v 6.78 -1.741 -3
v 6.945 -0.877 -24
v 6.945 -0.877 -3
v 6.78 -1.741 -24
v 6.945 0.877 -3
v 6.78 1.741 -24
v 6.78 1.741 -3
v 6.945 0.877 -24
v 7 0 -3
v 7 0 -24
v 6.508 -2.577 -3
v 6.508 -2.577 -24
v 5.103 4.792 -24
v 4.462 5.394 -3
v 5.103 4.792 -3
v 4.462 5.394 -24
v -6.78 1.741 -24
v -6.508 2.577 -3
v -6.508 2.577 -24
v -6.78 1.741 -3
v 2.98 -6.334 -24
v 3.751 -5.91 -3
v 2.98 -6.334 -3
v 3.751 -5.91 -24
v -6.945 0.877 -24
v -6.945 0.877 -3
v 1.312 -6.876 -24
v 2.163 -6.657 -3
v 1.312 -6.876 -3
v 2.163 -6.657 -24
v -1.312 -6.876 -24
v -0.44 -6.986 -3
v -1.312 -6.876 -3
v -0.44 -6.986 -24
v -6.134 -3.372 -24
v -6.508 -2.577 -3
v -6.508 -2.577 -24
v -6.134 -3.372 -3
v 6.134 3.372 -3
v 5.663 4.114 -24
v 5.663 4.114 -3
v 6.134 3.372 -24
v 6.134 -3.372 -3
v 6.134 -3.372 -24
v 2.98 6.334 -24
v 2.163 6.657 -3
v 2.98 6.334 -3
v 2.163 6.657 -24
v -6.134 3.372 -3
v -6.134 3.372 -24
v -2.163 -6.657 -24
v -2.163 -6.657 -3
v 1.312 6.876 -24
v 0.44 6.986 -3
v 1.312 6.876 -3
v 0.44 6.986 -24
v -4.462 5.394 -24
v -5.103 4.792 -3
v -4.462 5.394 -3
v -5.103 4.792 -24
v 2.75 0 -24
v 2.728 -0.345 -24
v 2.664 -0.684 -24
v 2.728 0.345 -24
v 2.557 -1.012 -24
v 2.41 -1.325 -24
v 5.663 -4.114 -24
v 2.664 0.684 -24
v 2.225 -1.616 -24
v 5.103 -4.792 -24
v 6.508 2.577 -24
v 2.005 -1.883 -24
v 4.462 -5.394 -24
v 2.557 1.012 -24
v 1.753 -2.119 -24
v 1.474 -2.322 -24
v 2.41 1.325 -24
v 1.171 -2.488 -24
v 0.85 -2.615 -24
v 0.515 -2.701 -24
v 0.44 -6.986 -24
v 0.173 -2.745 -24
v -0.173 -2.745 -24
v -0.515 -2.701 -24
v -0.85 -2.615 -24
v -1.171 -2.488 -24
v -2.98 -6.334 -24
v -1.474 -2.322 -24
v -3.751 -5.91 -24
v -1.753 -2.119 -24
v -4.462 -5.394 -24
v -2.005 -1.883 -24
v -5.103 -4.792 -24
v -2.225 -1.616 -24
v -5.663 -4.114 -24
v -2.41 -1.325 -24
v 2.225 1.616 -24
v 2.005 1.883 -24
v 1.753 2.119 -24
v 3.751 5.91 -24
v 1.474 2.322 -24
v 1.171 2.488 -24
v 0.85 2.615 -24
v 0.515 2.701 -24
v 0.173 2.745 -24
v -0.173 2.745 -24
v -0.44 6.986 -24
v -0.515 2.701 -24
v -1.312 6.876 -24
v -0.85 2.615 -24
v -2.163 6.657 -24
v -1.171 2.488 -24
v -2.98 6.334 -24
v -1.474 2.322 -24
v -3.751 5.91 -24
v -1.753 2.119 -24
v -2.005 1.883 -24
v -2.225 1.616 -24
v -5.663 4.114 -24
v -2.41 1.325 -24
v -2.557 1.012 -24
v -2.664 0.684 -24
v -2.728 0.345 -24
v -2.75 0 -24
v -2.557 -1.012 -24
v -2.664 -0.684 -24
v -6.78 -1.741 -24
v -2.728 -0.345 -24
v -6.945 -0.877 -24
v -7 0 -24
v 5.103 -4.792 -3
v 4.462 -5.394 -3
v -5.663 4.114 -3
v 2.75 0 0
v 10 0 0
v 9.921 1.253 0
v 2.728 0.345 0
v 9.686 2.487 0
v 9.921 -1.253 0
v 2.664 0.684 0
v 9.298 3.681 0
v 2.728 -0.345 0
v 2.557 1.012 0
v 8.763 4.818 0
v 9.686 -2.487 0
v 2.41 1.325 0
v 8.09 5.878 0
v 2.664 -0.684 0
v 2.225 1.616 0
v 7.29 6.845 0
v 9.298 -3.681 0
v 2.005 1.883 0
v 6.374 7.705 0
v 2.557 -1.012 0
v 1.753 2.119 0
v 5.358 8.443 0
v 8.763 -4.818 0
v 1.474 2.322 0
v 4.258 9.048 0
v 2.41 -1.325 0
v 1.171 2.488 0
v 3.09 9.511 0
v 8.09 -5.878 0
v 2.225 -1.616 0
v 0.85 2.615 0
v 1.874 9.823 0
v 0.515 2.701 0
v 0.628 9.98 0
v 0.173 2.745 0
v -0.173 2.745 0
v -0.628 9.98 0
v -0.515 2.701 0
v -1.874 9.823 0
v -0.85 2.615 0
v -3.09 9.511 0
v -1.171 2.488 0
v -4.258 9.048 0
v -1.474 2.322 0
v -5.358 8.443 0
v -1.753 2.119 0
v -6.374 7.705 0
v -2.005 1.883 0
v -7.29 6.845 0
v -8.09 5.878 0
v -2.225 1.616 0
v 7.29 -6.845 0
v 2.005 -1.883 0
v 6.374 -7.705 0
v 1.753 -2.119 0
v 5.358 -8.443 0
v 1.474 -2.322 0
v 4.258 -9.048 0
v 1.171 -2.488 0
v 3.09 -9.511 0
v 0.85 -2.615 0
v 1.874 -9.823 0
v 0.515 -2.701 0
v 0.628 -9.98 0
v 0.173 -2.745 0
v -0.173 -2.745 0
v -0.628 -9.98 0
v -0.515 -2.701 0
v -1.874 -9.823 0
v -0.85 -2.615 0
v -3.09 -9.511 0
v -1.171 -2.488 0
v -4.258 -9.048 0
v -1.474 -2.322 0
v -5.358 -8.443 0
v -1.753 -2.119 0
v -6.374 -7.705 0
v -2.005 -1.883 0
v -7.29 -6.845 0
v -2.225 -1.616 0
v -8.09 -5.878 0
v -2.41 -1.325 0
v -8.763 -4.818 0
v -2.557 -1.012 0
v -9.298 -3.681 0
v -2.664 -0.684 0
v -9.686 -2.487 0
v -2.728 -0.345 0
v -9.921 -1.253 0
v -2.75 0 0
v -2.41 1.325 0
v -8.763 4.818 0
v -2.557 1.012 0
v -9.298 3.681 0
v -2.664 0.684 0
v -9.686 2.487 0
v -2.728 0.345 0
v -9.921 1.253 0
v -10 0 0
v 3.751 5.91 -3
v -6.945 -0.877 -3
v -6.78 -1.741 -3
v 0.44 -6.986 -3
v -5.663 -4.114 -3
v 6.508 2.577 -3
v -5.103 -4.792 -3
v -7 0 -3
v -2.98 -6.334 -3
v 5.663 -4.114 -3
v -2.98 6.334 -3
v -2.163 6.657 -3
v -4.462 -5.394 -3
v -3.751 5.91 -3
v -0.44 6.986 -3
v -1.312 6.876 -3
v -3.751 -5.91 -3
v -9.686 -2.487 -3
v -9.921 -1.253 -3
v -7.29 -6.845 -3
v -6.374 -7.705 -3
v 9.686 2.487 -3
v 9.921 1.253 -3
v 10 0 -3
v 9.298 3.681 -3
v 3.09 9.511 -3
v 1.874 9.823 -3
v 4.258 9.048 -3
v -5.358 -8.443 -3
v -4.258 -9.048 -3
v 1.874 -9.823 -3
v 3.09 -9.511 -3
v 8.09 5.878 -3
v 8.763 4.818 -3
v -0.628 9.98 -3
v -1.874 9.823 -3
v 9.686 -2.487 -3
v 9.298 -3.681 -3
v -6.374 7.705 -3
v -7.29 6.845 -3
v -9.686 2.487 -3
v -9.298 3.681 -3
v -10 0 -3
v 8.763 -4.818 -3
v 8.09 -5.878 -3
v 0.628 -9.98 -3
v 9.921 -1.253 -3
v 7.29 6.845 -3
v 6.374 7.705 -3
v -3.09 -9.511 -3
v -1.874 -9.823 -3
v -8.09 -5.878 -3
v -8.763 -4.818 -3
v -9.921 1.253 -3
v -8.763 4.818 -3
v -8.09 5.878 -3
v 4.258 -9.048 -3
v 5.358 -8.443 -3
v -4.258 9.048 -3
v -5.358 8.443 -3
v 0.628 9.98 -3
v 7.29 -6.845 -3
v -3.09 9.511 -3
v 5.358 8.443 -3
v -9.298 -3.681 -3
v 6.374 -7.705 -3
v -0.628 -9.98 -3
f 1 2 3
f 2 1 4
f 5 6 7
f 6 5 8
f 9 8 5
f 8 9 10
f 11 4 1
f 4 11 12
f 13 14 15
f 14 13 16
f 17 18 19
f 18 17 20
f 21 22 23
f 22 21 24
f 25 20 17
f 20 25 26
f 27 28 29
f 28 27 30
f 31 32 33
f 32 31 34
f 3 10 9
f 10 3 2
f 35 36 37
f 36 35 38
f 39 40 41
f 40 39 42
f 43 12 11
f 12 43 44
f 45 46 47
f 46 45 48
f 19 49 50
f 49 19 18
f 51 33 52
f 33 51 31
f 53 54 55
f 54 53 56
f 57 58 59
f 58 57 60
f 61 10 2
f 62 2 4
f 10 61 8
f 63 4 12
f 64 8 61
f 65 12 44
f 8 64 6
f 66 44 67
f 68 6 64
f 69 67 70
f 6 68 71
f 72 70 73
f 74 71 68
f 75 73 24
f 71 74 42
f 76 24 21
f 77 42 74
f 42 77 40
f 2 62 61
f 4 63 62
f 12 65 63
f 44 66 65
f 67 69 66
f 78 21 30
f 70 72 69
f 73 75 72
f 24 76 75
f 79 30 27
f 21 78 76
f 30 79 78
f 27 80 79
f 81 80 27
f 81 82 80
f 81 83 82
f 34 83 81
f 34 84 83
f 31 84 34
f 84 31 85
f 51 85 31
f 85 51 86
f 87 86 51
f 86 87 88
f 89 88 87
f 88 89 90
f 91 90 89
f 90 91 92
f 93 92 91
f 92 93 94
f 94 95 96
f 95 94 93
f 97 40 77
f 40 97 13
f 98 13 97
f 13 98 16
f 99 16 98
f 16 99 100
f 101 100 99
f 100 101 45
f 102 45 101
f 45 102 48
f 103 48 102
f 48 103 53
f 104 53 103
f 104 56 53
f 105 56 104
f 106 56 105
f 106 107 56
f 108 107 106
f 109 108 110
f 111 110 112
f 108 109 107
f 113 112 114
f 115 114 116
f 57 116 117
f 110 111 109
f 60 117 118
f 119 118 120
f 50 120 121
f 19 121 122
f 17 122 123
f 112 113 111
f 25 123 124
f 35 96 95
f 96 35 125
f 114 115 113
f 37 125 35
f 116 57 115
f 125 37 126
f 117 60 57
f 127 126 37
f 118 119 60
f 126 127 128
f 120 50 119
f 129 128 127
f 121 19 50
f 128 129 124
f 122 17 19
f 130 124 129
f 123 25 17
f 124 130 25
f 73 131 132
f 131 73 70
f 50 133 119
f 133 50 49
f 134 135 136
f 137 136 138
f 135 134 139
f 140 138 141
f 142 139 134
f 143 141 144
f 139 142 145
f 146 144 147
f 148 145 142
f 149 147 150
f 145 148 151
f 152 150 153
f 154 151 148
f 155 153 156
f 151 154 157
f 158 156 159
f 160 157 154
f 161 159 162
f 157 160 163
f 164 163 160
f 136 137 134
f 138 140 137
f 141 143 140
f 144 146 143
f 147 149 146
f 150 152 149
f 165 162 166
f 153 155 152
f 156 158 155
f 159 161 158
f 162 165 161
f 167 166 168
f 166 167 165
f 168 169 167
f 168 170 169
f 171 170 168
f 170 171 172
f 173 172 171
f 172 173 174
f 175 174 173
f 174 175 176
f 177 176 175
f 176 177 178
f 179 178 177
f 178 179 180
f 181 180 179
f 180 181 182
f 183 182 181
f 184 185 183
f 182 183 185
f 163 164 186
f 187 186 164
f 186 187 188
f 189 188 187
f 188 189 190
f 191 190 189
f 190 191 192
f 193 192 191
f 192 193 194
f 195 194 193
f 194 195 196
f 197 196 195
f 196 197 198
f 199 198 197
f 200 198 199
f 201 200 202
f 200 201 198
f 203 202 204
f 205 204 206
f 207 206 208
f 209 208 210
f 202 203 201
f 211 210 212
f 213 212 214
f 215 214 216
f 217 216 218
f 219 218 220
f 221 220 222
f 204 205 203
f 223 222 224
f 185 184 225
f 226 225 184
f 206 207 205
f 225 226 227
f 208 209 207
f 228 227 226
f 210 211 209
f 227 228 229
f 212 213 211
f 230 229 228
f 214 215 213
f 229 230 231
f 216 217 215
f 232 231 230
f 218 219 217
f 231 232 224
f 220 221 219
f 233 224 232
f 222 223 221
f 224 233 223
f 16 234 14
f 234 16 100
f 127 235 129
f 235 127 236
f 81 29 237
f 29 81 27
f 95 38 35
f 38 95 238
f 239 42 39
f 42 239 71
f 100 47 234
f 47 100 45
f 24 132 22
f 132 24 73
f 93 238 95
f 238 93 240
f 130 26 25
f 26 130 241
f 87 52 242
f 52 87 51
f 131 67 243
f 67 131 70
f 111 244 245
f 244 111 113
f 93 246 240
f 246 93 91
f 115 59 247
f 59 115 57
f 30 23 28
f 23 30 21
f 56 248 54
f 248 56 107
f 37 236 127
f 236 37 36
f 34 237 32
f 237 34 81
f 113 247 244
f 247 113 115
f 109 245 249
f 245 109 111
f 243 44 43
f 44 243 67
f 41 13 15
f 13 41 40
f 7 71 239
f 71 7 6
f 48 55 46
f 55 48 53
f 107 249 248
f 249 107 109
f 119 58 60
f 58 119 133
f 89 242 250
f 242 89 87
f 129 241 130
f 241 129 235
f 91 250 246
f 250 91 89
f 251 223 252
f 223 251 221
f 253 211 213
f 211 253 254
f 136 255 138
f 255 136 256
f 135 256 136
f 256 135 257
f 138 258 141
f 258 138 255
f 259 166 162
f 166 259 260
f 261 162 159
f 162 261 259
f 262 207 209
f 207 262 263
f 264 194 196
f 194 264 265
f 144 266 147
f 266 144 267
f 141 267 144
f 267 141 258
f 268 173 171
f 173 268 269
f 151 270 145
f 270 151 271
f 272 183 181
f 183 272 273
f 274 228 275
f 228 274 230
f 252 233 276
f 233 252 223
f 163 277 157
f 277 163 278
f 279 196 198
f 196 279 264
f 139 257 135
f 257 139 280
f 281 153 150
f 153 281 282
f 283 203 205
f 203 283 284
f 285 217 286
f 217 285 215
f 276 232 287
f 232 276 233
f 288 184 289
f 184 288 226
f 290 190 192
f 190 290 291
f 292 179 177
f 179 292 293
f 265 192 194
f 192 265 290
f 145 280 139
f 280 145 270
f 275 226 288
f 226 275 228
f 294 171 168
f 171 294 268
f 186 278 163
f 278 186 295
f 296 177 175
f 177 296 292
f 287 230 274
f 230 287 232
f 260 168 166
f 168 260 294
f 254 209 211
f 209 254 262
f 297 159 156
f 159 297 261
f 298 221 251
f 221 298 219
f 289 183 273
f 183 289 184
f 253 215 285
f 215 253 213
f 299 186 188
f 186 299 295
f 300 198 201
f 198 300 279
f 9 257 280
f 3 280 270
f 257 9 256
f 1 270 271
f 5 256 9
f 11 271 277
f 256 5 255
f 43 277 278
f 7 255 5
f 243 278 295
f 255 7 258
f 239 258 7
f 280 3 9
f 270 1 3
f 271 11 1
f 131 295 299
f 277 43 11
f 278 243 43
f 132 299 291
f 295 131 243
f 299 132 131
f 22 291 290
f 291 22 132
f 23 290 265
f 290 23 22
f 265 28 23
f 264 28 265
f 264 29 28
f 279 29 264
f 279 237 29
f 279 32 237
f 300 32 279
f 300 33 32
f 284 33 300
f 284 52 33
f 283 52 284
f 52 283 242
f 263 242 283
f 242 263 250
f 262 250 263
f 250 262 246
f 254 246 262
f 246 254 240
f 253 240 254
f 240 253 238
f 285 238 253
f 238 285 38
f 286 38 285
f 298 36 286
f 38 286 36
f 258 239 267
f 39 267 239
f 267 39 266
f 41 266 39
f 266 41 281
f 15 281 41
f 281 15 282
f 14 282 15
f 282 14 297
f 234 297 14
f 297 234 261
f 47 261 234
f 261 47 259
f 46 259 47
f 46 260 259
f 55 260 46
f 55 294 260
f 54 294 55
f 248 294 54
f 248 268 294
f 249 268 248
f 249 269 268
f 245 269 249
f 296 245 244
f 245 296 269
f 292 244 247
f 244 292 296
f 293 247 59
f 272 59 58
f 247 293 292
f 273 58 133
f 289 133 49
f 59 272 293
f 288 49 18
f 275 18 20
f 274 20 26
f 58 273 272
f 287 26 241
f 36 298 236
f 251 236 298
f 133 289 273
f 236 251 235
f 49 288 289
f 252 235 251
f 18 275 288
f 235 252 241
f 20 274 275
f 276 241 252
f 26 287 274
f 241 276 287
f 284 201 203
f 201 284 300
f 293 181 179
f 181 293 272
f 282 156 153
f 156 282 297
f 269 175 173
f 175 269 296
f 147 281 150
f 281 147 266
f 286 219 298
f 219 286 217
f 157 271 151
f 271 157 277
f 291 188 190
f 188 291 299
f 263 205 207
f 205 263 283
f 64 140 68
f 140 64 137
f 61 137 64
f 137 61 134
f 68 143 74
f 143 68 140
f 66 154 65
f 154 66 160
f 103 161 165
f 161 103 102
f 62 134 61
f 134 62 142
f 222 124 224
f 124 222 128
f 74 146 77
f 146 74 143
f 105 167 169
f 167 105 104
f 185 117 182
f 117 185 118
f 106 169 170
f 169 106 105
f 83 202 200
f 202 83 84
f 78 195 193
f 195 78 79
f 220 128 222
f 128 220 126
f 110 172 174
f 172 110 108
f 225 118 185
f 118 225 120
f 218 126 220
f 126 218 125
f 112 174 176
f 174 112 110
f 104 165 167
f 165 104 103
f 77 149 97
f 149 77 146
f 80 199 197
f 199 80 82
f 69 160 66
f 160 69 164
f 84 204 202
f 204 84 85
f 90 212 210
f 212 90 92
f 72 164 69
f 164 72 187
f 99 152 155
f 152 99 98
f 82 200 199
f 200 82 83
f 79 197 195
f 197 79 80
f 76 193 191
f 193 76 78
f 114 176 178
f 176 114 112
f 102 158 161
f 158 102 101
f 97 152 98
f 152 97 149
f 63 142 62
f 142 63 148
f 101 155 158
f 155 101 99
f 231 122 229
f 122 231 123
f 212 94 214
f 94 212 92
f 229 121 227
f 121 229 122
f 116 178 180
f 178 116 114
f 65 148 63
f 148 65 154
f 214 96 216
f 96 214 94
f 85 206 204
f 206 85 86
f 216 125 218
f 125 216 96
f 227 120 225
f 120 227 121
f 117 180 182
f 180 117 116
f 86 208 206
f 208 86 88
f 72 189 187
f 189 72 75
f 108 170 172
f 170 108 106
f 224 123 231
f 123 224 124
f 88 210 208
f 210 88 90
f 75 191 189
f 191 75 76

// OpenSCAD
$fn = 50;


difference() {
	union() {
		translate(v = [0, 0, -24.0000000000]) {
			cylinder(h = 24, r = 7.0000000000);
		}
		translate(v = [0, 0, -3.0000000000]) {
			cylinder(h = 3, r = 10.0000000000);
		}
	}
	union() {
		#translate(v = [0, 0, -24]) {
			cylinder(h = 24, r = 2.7500000000);
		}
	}
}
